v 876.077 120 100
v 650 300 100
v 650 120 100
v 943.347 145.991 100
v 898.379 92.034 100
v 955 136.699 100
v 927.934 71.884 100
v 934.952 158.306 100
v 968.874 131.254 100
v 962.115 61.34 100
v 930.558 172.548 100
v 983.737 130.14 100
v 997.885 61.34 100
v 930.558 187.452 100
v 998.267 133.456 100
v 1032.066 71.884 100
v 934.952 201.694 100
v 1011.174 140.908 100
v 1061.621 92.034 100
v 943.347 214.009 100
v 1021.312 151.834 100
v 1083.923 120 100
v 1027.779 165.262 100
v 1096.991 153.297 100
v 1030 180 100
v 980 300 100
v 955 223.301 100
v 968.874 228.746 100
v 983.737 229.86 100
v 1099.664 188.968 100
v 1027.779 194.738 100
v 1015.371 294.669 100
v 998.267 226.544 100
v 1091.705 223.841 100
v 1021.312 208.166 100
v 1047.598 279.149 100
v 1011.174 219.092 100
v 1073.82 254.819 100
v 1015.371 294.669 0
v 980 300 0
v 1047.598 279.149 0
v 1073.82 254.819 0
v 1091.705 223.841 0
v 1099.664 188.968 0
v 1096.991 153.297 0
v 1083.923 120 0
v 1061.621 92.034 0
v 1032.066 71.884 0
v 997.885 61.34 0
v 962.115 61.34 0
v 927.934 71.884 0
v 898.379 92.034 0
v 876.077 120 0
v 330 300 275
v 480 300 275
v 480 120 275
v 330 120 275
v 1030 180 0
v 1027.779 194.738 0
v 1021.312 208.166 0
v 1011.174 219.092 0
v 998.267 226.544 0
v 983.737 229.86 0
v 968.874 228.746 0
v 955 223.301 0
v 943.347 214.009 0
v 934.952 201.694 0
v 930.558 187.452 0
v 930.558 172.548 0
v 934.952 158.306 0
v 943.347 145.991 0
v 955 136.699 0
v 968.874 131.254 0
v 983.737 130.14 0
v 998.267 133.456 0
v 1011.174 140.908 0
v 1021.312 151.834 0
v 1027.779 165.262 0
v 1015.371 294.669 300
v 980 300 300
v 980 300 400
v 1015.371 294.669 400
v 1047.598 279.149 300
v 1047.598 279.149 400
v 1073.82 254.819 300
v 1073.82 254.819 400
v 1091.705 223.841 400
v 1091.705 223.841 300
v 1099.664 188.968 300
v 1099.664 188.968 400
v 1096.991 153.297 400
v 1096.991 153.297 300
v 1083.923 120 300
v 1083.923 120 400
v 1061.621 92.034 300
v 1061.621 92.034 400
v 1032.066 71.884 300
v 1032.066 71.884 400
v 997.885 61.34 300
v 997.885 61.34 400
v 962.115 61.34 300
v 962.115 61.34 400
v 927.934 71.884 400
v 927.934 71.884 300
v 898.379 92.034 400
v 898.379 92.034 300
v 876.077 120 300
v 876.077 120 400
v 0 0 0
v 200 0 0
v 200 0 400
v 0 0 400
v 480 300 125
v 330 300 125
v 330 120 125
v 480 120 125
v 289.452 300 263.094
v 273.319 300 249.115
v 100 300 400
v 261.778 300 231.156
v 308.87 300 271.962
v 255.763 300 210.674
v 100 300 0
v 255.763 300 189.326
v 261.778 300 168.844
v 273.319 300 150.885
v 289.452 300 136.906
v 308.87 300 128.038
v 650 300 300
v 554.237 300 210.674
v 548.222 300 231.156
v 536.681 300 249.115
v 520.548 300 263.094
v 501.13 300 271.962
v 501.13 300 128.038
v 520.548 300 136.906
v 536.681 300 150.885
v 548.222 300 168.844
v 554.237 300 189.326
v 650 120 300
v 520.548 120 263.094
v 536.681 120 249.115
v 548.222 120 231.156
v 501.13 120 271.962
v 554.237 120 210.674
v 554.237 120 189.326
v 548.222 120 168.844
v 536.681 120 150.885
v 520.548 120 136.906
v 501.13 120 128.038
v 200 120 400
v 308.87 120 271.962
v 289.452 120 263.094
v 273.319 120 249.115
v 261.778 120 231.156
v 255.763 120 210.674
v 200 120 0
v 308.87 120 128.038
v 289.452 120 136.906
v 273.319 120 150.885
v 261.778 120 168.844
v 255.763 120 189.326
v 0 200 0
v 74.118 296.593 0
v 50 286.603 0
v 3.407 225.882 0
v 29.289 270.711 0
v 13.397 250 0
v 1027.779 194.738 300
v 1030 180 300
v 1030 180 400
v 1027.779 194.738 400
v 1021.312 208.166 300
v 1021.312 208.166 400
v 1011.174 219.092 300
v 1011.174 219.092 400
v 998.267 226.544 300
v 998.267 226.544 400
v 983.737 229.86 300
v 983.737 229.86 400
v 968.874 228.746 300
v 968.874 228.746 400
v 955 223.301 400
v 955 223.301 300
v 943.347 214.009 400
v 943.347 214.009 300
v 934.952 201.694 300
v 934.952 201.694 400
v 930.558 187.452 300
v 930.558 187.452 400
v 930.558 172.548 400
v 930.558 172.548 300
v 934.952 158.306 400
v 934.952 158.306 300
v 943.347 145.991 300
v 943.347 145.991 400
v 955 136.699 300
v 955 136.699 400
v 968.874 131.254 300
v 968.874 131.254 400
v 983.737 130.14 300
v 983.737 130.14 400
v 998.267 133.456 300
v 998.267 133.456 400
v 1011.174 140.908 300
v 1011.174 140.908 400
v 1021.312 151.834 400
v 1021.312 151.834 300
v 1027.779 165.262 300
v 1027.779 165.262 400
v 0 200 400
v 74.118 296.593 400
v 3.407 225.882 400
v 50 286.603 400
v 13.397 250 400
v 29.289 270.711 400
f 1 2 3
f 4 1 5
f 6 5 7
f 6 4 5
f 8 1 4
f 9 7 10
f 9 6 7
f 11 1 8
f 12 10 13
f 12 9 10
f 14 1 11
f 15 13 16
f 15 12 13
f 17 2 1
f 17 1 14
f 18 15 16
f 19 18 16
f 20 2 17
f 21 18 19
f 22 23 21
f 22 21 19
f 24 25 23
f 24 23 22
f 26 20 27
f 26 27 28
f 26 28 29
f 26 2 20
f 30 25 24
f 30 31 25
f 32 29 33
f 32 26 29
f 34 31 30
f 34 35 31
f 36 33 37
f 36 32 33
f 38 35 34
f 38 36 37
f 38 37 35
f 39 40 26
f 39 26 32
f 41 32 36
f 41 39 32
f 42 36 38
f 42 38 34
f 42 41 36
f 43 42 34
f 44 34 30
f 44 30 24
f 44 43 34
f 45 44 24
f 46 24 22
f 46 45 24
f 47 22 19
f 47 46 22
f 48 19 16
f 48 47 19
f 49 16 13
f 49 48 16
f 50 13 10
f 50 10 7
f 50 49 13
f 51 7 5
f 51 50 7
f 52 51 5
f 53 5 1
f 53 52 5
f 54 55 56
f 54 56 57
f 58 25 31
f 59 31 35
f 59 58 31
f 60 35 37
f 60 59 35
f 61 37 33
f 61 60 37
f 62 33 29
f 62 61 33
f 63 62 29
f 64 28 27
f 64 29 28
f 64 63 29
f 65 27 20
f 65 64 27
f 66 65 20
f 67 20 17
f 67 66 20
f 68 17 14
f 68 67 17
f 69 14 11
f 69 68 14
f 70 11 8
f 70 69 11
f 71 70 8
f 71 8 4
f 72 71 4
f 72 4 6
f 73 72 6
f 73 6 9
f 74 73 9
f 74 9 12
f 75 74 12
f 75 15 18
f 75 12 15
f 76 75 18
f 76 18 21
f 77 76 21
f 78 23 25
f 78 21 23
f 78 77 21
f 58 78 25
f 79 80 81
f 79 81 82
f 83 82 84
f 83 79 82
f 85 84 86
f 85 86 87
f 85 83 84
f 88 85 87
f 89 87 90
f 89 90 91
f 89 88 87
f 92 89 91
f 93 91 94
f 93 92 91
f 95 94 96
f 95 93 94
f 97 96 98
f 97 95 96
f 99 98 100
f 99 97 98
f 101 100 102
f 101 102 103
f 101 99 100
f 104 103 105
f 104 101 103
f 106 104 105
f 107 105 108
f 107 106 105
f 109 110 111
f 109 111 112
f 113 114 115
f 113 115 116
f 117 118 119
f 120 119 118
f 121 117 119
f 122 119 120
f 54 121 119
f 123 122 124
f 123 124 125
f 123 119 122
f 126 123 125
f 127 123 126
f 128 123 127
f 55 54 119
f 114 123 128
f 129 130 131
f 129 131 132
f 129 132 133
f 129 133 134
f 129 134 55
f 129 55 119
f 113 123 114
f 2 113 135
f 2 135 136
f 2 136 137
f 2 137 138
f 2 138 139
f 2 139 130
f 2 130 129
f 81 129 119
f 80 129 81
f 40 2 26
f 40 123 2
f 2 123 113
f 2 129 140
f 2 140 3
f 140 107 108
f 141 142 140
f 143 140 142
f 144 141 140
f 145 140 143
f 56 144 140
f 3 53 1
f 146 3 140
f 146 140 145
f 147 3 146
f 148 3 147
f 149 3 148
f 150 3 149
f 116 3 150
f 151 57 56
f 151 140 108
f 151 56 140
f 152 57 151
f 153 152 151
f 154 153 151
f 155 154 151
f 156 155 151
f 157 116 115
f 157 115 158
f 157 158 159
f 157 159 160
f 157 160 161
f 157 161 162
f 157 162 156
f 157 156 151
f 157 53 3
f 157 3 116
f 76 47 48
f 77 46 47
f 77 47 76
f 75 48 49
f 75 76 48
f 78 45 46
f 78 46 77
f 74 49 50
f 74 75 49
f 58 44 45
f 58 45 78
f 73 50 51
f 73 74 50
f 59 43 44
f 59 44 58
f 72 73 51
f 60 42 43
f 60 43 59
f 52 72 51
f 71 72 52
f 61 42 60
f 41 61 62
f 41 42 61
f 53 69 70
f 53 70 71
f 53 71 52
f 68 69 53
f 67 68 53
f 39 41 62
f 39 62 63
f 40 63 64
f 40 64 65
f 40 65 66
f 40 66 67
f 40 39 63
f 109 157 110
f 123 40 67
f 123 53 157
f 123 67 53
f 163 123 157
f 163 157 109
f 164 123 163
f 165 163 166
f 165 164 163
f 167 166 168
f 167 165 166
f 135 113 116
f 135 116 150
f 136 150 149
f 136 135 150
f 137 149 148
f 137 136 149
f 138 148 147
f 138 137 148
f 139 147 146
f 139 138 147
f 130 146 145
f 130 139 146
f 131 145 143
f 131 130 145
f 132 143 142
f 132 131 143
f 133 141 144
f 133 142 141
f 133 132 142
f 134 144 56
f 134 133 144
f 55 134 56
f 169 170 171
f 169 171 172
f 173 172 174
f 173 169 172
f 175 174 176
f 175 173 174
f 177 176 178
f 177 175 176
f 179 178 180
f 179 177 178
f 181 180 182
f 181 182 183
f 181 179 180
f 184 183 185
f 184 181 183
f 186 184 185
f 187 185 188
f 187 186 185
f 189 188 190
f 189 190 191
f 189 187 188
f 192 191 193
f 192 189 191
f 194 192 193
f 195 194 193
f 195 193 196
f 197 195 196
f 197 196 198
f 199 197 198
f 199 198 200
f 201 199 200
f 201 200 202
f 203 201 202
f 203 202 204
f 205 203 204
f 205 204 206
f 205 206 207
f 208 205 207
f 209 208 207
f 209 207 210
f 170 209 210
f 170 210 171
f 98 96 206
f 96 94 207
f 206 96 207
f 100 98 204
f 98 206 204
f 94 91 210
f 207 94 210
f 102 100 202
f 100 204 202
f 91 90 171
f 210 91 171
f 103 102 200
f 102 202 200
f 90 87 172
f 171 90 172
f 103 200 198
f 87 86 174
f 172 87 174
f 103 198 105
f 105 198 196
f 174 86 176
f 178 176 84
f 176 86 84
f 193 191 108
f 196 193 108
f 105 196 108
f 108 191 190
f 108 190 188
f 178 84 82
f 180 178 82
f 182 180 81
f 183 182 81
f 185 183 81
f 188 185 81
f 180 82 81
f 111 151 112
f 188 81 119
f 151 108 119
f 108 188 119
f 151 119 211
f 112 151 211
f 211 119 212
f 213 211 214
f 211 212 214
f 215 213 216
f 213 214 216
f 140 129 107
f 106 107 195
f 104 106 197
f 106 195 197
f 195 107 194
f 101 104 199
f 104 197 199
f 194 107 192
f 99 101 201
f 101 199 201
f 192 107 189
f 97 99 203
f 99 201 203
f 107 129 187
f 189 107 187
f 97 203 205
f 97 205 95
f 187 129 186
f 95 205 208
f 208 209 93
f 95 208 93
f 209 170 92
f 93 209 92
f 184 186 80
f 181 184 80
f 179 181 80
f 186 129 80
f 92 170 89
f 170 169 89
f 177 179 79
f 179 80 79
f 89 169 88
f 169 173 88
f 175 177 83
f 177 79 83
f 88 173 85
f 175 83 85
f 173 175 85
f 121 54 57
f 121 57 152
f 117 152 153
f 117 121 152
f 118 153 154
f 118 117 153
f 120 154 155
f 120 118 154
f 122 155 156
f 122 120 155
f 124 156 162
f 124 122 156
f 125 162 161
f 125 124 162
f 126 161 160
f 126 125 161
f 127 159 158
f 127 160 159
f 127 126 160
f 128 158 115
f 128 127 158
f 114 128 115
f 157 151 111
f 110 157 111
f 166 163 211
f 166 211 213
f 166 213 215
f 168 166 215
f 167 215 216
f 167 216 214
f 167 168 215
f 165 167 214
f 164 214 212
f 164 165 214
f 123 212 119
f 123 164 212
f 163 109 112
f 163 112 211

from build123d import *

# Parameters (mm, degrees)
ESQUISSE1_R             = 50
BOSS_EXTRU_1_DEPTH      = 400
ESQUISSE2_W             = 600
ESQUISSE2_H             = 200
ENL_V_MAT_EXTRU_1_DEPTH = 1209.304597359


with BuildPart() as part:
    # Esquisse1 → Boss.-Extru.1 (new body)
    with BuildSketch(Plane.XY):
        with BuildLine():
            Line((0, 0), (0, 200))
            ThreePointArc((0, 200), (29.289321881, 270.710678119), (100, 300))
            Line((100, 300), (980, 300))
            ThreePointArc((980, 300), (1083.923048454, 120), (876.076951546, 120))
            Line((876.076951546, 120), (200, 120))
            Line((200, 120), (200, 0))
            Line((200, 0), (0, 0))
        make_face()
        with Locations((980, 180)):
            Circle(ESQUISSE1_R, mode=Mode.SUBTRACT)
    extrude(amount=BOSS_EXTRU_1_DEPTH)

    # Esquisse2 → Enlèv. mat.-Extru.1 (cut, through all)
    with BuildSketch(Plane(origin=(0, 300, 0), x_dir=(1, 0, 0), z_dir=(0, 1, 0))):
        with BuildLine():
            Line((330, -125), (480, -125))
            ThreePointArc((480, -125), (555, -200), (480, -275))
            Line((480, -275), (330, -275))
            ThreePointArc((330, -275), (255, -200), (330, -125))
        make_face()
        with Locations((950, -200)):
            Rectangle(ESQUISSE2_W, ESQUISSE2_H)
    extrude(amount=-ENL_V_MAT_EXTRU_1_DEPTH, mode=Mode.SUBTRACT)


solid = part.part
